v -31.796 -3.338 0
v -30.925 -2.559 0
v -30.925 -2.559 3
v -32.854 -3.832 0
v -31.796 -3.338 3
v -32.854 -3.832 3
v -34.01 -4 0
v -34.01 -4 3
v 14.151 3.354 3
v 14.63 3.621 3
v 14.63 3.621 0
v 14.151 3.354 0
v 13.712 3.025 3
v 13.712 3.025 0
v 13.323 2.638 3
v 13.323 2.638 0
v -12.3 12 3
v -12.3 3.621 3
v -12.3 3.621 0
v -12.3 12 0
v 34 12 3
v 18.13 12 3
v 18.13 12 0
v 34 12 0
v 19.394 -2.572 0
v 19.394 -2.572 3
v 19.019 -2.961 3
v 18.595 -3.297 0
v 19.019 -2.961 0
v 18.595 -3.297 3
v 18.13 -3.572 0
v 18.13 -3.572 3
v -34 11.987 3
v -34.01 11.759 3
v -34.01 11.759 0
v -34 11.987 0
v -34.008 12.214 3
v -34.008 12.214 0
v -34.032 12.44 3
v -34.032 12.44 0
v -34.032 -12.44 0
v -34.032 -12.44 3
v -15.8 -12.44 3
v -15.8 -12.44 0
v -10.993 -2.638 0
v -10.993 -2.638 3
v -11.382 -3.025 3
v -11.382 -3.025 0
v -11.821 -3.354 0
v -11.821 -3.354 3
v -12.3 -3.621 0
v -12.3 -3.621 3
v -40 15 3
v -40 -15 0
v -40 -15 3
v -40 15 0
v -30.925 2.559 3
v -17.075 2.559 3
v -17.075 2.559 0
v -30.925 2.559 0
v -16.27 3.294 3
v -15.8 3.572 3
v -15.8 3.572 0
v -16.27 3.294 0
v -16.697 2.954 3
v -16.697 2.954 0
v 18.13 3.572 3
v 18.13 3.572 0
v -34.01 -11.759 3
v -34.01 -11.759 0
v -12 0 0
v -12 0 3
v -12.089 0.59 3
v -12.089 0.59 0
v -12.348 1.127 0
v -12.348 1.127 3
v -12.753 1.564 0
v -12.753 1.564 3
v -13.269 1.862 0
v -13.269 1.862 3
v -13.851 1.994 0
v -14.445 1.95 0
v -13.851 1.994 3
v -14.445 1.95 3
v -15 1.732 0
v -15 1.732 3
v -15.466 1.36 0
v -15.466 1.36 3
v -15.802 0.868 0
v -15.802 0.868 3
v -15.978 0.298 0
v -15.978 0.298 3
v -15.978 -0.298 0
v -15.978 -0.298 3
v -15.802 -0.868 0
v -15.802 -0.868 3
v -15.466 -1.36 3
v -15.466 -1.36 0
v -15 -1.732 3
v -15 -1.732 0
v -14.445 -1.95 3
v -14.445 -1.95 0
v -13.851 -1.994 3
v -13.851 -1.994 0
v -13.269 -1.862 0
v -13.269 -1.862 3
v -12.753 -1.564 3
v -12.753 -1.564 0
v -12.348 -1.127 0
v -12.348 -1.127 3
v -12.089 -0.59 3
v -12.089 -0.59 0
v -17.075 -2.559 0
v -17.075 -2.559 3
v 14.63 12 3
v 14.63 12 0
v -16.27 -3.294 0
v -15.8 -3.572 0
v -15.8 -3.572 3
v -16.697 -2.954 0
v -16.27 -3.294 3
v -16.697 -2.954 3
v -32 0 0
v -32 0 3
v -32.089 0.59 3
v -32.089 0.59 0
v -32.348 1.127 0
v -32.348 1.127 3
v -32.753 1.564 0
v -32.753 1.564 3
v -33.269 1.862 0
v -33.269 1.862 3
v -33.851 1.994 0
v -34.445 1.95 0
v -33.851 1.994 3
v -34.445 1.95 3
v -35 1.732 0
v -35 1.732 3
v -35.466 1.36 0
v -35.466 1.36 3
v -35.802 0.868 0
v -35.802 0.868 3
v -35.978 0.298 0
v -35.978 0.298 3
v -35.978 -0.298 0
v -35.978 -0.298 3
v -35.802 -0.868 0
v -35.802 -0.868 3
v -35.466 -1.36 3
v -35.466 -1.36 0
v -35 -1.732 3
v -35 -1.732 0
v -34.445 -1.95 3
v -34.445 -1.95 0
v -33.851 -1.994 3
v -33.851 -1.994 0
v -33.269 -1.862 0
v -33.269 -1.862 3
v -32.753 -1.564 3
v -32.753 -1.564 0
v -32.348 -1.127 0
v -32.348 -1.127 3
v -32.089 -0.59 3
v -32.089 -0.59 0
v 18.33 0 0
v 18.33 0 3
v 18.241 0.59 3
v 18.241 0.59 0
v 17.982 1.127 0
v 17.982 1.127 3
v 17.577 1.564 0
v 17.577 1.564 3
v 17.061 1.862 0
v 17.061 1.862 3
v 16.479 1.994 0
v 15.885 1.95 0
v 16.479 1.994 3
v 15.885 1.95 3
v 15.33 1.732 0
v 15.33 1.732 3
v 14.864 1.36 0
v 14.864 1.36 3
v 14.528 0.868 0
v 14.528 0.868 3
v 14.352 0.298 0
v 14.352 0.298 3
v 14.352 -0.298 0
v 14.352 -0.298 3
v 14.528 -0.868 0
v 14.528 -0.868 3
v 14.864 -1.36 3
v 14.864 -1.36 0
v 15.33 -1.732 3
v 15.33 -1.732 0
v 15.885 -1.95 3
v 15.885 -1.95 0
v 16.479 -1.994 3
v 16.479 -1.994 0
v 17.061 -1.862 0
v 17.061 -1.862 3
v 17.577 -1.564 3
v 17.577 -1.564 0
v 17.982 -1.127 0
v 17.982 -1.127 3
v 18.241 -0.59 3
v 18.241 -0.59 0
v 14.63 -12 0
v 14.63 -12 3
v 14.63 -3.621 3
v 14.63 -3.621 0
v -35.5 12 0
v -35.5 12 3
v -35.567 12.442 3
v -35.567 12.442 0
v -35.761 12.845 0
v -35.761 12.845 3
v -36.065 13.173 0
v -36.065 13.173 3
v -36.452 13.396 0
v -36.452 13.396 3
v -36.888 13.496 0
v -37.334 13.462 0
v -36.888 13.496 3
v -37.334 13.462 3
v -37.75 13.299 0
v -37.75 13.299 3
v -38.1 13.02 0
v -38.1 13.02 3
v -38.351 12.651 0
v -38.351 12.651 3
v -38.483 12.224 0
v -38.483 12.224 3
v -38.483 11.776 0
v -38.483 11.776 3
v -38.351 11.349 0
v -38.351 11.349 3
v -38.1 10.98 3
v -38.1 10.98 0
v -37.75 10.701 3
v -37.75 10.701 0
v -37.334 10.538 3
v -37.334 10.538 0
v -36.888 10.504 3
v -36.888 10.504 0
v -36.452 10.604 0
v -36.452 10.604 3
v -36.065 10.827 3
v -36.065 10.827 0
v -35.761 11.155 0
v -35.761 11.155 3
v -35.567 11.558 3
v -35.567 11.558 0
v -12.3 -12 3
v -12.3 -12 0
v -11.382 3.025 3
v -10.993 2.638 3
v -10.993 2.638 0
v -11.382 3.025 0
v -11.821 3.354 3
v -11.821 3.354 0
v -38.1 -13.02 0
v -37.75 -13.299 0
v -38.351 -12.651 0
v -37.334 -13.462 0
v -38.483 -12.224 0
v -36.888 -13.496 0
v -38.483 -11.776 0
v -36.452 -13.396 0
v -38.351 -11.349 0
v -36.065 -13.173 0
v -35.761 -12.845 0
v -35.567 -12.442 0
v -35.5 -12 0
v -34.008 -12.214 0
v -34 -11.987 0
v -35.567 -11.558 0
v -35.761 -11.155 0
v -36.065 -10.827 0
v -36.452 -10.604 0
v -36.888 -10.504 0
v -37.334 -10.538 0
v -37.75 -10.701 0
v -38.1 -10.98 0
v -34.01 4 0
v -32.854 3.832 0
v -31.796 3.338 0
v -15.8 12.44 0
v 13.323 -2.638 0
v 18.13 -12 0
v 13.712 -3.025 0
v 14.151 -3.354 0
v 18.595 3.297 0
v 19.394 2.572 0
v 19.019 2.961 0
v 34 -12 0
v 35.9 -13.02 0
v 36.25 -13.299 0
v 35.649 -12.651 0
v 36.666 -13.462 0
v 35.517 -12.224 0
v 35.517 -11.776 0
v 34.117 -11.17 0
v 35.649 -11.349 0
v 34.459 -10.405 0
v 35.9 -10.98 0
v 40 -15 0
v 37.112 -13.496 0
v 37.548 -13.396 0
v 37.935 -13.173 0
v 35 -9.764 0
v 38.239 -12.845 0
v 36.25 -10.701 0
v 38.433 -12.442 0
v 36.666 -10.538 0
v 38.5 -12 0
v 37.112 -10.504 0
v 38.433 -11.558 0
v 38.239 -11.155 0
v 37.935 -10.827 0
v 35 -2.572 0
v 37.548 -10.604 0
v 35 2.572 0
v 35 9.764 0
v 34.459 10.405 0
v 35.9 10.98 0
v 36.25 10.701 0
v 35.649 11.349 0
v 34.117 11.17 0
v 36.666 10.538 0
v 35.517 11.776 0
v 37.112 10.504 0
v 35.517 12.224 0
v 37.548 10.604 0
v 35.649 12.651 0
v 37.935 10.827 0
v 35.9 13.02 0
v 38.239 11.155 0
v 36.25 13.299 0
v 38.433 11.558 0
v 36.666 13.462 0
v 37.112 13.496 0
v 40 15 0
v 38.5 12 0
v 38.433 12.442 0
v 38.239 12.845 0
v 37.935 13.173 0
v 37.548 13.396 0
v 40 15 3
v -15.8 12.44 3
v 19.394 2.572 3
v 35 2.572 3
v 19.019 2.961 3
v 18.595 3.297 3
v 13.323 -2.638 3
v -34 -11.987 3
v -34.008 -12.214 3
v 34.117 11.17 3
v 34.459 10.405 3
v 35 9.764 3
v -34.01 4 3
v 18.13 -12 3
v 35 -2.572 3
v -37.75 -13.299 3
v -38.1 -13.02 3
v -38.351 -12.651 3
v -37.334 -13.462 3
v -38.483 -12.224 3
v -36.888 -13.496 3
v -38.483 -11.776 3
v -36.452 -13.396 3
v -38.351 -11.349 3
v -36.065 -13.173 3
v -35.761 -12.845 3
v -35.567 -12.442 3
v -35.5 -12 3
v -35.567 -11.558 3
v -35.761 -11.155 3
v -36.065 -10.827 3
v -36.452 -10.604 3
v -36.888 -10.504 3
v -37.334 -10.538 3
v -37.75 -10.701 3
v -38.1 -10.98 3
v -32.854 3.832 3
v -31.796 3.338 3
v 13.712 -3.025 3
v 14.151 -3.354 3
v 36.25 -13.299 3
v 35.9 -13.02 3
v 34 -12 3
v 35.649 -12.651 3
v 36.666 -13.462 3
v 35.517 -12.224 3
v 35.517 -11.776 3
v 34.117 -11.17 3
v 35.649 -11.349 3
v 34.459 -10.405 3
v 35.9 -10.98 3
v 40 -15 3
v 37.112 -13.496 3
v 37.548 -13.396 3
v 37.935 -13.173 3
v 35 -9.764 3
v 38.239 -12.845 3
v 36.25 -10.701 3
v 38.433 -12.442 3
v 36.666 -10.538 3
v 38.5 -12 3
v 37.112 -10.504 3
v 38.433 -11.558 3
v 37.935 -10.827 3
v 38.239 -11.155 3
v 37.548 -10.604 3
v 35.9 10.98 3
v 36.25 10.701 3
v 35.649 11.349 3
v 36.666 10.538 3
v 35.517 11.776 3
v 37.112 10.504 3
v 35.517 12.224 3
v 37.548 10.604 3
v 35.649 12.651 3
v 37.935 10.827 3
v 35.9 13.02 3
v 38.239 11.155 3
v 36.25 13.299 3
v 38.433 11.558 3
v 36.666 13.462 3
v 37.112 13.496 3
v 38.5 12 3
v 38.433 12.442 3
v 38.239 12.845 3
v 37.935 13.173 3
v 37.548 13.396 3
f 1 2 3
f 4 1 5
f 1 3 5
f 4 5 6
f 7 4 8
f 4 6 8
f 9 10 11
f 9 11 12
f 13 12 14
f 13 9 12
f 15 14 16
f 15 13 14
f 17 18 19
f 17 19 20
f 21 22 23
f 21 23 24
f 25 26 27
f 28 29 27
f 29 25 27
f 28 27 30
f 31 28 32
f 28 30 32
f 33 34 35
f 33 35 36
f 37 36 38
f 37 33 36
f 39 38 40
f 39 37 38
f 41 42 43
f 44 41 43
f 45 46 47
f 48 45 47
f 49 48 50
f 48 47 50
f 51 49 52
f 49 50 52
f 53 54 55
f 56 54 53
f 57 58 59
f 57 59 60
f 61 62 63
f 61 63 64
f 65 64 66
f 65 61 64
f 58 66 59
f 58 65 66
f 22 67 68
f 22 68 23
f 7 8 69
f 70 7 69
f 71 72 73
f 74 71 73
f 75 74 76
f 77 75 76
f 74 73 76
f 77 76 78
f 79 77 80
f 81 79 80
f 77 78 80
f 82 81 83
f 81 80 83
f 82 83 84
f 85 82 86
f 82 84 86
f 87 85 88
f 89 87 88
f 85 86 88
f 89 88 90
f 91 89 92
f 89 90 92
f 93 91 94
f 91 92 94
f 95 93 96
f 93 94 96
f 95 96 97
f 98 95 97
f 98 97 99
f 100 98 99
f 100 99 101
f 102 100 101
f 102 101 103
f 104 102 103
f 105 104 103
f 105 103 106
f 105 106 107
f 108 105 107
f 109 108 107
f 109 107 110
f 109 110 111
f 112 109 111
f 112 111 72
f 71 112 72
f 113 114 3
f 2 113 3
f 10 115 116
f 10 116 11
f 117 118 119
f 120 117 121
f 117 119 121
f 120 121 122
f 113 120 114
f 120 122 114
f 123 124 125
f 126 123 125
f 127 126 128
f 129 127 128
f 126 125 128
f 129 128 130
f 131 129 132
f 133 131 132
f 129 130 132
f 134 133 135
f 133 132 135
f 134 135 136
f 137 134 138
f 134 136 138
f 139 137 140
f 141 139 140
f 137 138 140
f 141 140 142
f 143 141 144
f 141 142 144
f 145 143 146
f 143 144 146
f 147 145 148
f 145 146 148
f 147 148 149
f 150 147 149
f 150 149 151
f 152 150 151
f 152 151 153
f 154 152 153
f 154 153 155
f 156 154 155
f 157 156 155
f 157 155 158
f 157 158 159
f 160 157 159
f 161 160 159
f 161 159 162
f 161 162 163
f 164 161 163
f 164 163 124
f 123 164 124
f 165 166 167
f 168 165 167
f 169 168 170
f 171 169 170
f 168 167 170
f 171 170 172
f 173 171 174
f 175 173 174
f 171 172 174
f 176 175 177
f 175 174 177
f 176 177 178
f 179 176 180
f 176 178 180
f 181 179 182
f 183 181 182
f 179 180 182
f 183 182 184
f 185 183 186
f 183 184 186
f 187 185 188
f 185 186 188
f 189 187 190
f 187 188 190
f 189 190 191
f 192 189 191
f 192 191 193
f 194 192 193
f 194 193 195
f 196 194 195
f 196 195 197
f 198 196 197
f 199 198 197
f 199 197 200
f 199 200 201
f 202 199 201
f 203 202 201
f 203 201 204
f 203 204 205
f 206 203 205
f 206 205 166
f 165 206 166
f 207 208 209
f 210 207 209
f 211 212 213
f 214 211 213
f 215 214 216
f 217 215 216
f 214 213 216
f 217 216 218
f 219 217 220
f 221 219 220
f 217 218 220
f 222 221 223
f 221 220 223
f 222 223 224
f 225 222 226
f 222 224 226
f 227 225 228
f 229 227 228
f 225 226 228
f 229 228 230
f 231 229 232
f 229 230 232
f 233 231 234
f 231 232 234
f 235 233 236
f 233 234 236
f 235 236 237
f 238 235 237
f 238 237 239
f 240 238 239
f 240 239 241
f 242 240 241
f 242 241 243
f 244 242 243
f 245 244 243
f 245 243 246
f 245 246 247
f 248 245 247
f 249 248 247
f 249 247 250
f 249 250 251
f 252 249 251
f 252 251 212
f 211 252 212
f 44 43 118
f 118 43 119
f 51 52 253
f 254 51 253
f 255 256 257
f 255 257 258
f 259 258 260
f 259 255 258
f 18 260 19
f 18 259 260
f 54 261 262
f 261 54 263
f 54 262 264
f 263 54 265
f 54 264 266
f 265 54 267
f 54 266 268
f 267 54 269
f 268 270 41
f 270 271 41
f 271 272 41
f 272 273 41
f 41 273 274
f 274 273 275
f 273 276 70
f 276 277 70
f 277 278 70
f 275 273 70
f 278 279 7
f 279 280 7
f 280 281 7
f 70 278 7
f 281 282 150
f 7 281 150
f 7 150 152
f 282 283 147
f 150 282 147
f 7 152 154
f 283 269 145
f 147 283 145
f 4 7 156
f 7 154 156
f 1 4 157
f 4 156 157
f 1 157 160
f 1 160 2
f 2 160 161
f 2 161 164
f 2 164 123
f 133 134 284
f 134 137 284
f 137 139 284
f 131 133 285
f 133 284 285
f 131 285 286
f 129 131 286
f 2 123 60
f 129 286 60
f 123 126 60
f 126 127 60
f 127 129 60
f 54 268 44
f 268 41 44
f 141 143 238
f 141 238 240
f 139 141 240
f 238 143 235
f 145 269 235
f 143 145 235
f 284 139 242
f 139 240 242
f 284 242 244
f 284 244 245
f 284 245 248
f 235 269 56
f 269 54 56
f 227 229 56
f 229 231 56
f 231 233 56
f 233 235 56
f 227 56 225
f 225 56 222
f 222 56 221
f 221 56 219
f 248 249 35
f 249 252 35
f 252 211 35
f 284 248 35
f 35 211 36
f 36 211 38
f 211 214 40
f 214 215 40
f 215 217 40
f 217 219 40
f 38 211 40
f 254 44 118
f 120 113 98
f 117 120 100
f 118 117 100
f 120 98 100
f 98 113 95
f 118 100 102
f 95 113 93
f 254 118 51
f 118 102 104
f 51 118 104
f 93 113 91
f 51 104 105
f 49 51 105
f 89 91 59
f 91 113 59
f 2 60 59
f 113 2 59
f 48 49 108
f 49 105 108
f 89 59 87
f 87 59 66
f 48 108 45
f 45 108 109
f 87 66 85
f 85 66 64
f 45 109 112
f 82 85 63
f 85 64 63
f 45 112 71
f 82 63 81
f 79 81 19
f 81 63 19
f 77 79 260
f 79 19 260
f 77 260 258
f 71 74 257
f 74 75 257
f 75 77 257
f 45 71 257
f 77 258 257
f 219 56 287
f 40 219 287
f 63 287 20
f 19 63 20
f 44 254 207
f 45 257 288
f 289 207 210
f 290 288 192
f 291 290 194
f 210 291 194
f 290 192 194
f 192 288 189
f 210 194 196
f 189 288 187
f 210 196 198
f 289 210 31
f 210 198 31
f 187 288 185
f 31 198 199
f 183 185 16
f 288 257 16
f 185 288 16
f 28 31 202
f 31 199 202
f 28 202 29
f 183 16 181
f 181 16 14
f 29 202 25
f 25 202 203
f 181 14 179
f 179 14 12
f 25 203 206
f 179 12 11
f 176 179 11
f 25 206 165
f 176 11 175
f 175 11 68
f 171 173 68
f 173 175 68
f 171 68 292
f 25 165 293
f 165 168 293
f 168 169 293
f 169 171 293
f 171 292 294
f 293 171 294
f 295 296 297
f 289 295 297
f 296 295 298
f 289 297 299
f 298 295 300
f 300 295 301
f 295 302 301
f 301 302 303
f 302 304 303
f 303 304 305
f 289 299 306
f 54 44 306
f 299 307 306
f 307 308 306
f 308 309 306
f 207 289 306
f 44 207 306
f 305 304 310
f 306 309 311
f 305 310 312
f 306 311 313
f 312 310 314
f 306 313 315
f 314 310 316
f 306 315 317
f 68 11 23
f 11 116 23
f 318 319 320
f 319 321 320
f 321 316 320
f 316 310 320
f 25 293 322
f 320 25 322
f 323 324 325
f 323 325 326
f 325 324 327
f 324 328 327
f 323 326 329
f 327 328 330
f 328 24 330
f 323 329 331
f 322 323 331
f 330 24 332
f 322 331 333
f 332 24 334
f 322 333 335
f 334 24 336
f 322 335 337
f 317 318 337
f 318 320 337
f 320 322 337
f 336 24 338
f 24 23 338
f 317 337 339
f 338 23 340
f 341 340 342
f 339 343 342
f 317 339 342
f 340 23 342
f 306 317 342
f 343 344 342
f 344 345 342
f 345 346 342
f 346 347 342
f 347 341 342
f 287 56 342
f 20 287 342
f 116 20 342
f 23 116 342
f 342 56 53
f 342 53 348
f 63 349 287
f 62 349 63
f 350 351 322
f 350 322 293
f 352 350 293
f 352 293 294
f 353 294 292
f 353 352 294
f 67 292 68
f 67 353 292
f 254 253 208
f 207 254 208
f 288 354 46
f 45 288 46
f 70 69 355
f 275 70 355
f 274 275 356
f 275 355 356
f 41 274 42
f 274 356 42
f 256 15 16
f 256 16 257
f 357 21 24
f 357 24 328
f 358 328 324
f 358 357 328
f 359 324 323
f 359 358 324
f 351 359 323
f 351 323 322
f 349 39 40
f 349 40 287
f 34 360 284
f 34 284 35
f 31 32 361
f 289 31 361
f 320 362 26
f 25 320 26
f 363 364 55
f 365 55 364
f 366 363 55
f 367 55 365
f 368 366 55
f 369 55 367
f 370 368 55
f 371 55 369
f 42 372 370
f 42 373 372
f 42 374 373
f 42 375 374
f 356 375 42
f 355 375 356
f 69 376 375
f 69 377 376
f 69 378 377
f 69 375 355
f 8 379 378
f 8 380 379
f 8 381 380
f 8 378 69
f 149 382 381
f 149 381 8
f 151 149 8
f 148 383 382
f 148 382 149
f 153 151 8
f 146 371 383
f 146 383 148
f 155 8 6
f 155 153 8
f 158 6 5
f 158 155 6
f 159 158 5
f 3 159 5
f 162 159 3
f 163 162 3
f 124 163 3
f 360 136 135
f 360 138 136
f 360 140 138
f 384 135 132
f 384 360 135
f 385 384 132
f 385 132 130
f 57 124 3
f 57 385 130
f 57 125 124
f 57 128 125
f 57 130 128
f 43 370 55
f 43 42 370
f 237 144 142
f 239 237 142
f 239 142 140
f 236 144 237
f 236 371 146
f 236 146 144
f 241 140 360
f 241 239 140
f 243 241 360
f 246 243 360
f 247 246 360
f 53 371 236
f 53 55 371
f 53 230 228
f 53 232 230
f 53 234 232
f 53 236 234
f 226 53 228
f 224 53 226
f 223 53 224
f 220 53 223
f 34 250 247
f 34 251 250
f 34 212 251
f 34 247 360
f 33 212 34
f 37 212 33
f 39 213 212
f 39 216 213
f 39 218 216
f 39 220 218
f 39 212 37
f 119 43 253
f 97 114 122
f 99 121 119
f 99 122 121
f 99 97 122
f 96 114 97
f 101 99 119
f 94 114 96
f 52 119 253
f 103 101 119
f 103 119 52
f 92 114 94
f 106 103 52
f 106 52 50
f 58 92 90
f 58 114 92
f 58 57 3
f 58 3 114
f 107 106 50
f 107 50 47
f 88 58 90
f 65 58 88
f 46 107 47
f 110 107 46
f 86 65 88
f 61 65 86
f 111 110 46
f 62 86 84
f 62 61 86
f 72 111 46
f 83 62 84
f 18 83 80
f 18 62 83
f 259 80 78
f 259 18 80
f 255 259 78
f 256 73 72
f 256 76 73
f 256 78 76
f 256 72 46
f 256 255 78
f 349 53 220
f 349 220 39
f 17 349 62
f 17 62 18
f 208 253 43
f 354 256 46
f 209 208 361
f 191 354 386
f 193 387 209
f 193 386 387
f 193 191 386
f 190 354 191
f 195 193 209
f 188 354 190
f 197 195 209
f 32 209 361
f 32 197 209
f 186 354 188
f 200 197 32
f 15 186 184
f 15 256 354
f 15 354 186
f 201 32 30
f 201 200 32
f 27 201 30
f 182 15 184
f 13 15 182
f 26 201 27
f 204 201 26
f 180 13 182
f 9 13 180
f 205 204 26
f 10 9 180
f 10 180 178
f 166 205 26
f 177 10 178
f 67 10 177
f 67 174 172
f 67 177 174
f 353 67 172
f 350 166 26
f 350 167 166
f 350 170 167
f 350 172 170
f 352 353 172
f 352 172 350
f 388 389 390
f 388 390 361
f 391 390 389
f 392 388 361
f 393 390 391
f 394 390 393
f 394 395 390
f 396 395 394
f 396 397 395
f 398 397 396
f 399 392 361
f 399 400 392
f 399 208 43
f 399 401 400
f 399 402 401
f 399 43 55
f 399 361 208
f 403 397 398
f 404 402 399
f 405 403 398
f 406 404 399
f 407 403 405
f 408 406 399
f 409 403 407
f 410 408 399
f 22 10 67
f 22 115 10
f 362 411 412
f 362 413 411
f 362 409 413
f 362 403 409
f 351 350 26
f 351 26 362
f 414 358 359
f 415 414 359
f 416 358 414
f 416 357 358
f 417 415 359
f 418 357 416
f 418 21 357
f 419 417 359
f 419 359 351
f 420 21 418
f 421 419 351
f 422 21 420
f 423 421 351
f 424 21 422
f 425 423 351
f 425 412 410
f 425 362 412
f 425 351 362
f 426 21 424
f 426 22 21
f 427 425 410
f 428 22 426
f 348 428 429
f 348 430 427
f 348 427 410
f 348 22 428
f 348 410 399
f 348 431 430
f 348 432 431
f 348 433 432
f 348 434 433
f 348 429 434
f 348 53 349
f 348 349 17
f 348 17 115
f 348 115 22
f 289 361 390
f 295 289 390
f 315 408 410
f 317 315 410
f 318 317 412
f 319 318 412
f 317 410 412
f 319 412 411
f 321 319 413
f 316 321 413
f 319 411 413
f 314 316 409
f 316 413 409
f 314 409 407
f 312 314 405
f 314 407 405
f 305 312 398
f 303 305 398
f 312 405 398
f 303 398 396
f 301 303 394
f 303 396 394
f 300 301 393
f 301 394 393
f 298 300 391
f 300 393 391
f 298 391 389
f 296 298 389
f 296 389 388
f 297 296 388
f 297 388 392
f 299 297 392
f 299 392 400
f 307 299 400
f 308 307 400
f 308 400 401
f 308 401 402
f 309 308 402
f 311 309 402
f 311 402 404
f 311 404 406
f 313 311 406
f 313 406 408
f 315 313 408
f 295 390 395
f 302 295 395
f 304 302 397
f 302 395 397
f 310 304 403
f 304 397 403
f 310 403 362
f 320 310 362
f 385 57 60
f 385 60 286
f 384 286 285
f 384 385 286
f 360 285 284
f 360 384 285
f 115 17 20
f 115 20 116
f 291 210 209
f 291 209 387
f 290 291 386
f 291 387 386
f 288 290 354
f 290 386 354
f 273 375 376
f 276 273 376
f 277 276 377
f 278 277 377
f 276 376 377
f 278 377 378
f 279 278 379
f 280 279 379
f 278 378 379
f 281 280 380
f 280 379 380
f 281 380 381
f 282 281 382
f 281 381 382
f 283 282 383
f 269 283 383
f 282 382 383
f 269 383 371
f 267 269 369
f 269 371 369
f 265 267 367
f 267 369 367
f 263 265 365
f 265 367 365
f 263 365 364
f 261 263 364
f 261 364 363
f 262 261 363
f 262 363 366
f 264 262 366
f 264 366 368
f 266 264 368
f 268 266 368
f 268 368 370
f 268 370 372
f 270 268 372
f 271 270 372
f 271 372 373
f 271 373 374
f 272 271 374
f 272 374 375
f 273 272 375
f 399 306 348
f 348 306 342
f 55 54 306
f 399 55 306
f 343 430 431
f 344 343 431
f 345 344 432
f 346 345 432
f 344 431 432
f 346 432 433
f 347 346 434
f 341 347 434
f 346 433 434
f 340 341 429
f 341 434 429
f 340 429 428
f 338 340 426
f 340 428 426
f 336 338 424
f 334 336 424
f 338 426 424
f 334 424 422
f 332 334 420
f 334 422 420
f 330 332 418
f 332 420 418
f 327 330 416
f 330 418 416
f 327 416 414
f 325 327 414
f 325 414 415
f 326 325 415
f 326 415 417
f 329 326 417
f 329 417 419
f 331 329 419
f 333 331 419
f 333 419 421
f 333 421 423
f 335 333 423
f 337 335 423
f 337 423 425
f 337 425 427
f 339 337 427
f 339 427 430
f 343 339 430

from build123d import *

# Parameters (mm, degrees)
SKETCH1_W           = 80
SKETCH1_H           = 30
BOSS_EXTRUDE1_DEPTH = 3
SKETCH2_R           = 1.5
SKETCH2_R_2         = 2
CUT_EXTRUDE2_DEPTH  = 4


with BuildPart() as part:
    # Sketch1 → Boss-Extrude1 (new body)
    with BuildSketch(Plane.XY):
        Rectangle(SKETCH1_W, SKETCH1_H)
    extrude(amount=BOSS_EXTRUDE1_DEPTH)

    # Sketch2 → Cut-Extrude2 (cut, through all)
    with BuildSketch(Plane.XY.offset(3)):
        with Locations((37, 12)):
            Circle(SKETCH2_R)
        with Locations((-37, 12)):
            Circle(SKETCH2_R)
        with Locations((37, -12)):
            Circle(SKETCH2_R)
        with Locations((-37, -12)):
            Circle(SKETCH2_R)
        with Locations((-14, 0)):
            Circle(SKETCH2_R_2)
        with Locations((-34, 0)):
            Circle(SKETCH2_R_2)
        with Locations((16.33, 0)):
            Circle(SKETCH2_R_2)
        with BuildLine():
            Line((-34.032472505, 12.440205142), (-15.8, 12.440205142))
            Line((-15.8, 12.440205142), (-15.8, 3.57211422))
            ThreePointArc((-15.8, 3.57211422), (-16.489437492, 3.130926536), (-17.074634359, 2.558637051))
            Line((-17.074634359, 2.558637051), (-30.925365641, 2.558637051))
            ThreePointArc((-30.925365641, 2.558637051), (-32.306522762, 3.623828755), (-34.009676412, 3.999988296))
            Line((-34.009676412, 3.999988296), (-34.009676412, 11.759241116))
            ThreePointArc((-34.009676412, 11.759241116), (-34.001679573, 12.100372396), (-34.032472505, 12.440205142))
        make_face()
        with BuildLine():
            Line((13.32333178, 2.638170998), (-10.99333178, 2.638170998))
            ThreePointArc((-10.99333178, 2.638170998), (-11.595928807, 3.196942555), (-12.3, 3.620773398))
            Line((-12.3, 3.620773398), (-12.3, 12))
            Line((-12.3, 12), (14.63, 12))
            Line((14.63, 12), (14.63, 3.620773398))
            ThreePointArc((14.63, 3.620773398), (13.925928807, 3.196942555), (13.32333178, 2.638170998))
        make_face()
        with BuildLine():
            Line((35, 2.571779372), (19.393649925, 2.571779372))
            ThreePointArc((19.393649925, 2.571779372), (18.812728358, 3.136249336), (18.13, 3.57211422))
            Line((18.13, 3.57211422), (18.13, 12))
            Line((18.13, 12), (34, 12))
            ThreePointArc((34, 12), (34.261387212, 10.775255129), (35, 9.763932023))
            Line((35, 9.763932023), (35, 2.571779372))
        make_face()
    cut_extrude2 = extrude(amount=-CUT_EXTRUDE2_DEPTH, mode=Mode.SUBTRACT)

    # Mirror1: Cut-Extrude2 across plane
    add(cut_extrude2.mirror(Plane.ZX), mode=Mode.SUBTRACT)


solid = part.part
